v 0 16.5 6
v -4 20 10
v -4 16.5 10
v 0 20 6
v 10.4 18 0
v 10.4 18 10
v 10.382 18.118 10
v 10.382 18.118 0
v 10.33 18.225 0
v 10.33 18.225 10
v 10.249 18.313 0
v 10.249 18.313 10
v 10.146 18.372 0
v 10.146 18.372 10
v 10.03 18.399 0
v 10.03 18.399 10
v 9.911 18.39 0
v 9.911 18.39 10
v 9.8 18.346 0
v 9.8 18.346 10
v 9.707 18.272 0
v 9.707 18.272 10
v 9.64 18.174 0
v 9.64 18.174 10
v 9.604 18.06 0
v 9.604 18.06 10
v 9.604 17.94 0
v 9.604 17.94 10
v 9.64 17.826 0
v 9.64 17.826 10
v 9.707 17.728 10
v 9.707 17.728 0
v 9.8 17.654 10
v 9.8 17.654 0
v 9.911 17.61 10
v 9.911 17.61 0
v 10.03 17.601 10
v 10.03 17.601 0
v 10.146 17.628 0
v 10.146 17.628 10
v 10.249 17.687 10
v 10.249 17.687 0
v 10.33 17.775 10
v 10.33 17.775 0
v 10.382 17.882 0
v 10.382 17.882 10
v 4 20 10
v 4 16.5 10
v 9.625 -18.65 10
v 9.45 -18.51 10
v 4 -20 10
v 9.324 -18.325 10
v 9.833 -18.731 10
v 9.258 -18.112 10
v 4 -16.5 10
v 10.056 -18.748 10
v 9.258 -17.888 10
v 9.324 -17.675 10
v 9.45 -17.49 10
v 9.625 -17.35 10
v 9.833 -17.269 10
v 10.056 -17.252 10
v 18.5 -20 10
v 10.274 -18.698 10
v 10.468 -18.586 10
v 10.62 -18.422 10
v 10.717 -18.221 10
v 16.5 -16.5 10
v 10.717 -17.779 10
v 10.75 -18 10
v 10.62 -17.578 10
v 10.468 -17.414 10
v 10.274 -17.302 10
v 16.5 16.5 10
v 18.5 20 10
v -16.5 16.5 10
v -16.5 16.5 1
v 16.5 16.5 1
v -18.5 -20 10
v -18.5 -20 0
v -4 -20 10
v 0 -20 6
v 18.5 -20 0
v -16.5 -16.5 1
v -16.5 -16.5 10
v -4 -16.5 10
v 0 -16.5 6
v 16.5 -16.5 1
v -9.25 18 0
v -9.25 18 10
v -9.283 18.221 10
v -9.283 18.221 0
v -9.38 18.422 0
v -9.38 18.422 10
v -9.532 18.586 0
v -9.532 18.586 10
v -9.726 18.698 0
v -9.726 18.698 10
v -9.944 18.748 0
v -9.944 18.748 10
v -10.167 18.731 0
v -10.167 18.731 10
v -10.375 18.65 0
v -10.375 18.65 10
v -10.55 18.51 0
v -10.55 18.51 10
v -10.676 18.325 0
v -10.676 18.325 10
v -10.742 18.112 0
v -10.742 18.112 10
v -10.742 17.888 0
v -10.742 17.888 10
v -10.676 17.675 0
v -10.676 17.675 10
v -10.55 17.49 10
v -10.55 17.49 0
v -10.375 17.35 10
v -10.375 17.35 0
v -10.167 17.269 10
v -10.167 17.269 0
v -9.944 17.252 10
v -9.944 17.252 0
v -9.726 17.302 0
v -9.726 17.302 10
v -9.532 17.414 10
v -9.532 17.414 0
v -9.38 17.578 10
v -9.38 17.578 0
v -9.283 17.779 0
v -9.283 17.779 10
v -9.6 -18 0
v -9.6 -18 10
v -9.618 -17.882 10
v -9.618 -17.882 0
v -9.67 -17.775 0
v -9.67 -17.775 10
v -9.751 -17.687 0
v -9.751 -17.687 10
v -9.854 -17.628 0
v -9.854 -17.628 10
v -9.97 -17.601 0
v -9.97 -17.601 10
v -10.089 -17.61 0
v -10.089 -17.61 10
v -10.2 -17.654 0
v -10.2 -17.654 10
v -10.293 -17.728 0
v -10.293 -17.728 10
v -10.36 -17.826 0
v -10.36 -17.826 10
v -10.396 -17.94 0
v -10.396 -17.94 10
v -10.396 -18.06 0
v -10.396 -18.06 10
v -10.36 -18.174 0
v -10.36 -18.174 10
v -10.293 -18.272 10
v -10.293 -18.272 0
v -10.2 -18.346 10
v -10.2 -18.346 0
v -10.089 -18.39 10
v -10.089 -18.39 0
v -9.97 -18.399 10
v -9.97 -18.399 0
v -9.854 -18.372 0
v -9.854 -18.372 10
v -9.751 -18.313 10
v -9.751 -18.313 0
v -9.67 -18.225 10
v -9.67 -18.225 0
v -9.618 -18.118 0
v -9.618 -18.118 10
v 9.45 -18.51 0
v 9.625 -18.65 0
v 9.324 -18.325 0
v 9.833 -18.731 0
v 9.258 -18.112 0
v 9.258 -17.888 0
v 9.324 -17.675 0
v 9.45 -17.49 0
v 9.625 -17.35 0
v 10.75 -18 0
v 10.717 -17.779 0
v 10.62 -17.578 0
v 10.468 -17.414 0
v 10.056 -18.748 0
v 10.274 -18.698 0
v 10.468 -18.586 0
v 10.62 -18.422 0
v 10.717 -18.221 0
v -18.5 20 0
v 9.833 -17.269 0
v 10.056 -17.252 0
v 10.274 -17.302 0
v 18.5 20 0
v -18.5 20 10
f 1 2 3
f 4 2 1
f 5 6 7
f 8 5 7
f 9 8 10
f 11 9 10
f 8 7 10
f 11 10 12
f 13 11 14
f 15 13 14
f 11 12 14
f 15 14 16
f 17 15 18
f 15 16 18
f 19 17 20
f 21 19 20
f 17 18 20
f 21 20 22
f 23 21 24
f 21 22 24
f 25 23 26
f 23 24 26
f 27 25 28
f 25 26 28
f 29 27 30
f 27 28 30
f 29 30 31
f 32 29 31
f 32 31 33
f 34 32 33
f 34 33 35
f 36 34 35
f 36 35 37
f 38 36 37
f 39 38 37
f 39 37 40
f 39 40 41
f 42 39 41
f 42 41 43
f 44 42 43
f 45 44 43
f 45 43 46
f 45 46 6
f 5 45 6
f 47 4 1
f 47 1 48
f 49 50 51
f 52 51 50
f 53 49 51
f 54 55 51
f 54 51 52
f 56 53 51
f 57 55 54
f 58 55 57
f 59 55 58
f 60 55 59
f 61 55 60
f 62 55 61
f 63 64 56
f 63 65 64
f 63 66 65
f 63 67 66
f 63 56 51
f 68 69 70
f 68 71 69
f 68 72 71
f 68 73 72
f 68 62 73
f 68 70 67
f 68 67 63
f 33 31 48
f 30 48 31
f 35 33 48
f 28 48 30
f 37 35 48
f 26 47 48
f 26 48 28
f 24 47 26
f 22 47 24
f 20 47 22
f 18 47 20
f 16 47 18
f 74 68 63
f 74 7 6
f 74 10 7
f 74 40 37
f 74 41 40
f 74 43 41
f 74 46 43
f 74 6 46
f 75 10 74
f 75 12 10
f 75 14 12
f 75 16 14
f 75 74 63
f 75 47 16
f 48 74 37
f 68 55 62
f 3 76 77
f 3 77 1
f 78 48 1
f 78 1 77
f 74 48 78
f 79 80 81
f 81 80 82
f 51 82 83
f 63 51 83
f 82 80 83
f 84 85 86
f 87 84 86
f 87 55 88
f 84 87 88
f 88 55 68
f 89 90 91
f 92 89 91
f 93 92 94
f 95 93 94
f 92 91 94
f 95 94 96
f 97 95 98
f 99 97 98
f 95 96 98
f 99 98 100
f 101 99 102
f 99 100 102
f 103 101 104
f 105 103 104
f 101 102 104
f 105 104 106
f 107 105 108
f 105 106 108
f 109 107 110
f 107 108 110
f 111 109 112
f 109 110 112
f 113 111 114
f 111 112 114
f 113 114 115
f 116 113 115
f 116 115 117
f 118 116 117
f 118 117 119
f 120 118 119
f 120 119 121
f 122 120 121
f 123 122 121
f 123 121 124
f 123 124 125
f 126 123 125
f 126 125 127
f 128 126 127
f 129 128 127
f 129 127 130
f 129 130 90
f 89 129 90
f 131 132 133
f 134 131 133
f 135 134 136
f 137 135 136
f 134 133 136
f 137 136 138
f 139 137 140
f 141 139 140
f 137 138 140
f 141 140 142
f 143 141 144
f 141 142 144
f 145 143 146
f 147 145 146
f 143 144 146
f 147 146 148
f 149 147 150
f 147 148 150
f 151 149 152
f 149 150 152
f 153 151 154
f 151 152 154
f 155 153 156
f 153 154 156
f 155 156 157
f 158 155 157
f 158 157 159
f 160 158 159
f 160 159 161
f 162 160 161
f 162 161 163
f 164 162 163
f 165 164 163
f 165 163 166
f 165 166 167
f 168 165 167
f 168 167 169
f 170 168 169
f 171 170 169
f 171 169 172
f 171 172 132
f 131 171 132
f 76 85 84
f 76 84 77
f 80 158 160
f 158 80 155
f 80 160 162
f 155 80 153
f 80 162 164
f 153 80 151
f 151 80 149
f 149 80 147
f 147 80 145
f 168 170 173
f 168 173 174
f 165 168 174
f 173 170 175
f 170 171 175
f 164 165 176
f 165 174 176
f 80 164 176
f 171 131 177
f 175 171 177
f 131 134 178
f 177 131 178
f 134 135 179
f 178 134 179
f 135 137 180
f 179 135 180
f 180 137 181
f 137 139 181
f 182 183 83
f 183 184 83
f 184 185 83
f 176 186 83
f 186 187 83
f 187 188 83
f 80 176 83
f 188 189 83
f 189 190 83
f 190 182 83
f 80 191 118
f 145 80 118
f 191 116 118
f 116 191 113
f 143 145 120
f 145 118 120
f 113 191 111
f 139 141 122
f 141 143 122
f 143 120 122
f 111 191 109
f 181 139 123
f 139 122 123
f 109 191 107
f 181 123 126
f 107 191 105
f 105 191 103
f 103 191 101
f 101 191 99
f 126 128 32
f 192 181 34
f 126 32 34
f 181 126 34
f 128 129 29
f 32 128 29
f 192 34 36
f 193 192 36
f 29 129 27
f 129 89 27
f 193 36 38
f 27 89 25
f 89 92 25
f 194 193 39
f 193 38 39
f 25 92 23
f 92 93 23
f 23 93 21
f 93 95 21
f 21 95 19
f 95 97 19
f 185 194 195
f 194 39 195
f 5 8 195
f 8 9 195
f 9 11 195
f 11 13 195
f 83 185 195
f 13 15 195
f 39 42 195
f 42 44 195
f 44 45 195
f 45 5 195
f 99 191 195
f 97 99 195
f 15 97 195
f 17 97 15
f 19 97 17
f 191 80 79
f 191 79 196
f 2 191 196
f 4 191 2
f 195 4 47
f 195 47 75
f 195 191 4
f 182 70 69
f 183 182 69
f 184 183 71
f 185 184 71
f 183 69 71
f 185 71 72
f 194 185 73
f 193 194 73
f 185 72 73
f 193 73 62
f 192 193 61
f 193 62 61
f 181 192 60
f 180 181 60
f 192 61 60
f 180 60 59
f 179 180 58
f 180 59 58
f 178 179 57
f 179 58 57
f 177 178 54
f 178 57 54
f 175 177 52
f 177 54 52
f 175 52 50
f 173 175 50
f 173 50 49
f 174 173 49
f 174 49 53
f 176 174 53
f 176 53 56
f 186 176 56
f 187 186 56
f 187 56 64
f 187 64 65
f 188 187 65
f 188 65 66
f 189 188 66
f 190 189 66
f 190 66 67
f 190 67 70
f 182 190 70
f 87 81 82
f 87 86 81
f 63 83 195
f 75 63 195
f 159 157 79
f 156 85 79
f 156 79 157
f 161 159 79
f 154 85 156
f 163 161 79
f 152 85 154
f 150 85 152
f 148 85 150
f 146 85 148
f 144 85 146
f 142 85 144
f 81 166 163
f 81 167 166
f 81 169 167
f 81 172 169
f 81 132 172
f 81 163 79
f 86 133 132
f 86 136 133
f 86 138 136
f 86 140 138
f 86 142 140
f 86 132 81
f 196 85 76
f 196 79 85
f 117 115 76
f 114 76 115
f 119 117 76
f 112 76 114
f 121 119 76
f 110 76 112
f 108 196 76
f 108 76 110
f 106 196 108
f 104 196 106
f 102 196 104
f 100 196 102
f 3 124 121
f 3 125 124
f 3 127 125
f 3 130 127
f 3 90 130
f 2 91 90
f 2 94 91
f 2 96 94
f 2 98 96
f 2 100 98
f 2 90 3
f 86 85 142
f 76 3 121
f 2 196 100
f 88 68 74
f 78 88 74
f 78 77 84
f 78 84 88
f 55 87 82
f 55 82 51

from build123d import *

# Parameters (mm, degrees)
SKETCH_W        = 37
SKETCH_H        = 40
PAD_DEPTH       = 10
SKETCH001_W     = 33
SKETCH001_H     = 33
POCKET_DEPTH    = 9
POCKET001_DEPTH = 40.001
SKETCH003_R     = 0.75
SKETCH003_R_2   = 0.4
POCKET002_DEPTH = 10.001


with BuildPart() as part:
    # Sketch → Pad (new body)
    with BuildSketch(Plane.XY):
        Rectangle(SKETCH_W, SKETCH_H)
    extrude(amount=PAD_DEPTH)

    # Sketch001 (on Face6 of Pad) → Pocket (cut)
    with BuildSketch(Plane.XY.offset(10)):
        Rectangle(SKETCH001_W, SKETCH001_H)
    extrude(amount=-POCKET_DEPTH, mode=Mode.SUBTRACT)

    # Sketch002 (on Face1 of Pocket) → Pocket001 (cut, through all)
    with BuildSketch(Plane(origin=(0, 20, 0), x_dir=(-1, 0, 0), z_dir=(0, 1, 0))):
        Polygon((14.424978, 20.424978), (0, 6), (-14.424978, 20.424978), align=None)
    extrude(amount=-POCKET001_DEPTH, mode=Mode.SUBTRACT)

    # Sketch003 (on Face7 of Pocket001) → Pocket002 (cut, through all)
    with BuildSketch(Plane.XY.offset(10)):
        with Locations((-10, 18)):
            Circle(SKETCH003_R)
        with Locations((10, 18)):
            Circle(SKETCH003_R_2)
        with Locations((-10, -18)):
            Circle(SKETCH003_R_2)
        with Locations((10, -18)):
            Circle(SKETCH003_R)
    extrude(amount=-POCKET002_DEPTH, mode=Mode.SUBTRACT)


solid = part.part
